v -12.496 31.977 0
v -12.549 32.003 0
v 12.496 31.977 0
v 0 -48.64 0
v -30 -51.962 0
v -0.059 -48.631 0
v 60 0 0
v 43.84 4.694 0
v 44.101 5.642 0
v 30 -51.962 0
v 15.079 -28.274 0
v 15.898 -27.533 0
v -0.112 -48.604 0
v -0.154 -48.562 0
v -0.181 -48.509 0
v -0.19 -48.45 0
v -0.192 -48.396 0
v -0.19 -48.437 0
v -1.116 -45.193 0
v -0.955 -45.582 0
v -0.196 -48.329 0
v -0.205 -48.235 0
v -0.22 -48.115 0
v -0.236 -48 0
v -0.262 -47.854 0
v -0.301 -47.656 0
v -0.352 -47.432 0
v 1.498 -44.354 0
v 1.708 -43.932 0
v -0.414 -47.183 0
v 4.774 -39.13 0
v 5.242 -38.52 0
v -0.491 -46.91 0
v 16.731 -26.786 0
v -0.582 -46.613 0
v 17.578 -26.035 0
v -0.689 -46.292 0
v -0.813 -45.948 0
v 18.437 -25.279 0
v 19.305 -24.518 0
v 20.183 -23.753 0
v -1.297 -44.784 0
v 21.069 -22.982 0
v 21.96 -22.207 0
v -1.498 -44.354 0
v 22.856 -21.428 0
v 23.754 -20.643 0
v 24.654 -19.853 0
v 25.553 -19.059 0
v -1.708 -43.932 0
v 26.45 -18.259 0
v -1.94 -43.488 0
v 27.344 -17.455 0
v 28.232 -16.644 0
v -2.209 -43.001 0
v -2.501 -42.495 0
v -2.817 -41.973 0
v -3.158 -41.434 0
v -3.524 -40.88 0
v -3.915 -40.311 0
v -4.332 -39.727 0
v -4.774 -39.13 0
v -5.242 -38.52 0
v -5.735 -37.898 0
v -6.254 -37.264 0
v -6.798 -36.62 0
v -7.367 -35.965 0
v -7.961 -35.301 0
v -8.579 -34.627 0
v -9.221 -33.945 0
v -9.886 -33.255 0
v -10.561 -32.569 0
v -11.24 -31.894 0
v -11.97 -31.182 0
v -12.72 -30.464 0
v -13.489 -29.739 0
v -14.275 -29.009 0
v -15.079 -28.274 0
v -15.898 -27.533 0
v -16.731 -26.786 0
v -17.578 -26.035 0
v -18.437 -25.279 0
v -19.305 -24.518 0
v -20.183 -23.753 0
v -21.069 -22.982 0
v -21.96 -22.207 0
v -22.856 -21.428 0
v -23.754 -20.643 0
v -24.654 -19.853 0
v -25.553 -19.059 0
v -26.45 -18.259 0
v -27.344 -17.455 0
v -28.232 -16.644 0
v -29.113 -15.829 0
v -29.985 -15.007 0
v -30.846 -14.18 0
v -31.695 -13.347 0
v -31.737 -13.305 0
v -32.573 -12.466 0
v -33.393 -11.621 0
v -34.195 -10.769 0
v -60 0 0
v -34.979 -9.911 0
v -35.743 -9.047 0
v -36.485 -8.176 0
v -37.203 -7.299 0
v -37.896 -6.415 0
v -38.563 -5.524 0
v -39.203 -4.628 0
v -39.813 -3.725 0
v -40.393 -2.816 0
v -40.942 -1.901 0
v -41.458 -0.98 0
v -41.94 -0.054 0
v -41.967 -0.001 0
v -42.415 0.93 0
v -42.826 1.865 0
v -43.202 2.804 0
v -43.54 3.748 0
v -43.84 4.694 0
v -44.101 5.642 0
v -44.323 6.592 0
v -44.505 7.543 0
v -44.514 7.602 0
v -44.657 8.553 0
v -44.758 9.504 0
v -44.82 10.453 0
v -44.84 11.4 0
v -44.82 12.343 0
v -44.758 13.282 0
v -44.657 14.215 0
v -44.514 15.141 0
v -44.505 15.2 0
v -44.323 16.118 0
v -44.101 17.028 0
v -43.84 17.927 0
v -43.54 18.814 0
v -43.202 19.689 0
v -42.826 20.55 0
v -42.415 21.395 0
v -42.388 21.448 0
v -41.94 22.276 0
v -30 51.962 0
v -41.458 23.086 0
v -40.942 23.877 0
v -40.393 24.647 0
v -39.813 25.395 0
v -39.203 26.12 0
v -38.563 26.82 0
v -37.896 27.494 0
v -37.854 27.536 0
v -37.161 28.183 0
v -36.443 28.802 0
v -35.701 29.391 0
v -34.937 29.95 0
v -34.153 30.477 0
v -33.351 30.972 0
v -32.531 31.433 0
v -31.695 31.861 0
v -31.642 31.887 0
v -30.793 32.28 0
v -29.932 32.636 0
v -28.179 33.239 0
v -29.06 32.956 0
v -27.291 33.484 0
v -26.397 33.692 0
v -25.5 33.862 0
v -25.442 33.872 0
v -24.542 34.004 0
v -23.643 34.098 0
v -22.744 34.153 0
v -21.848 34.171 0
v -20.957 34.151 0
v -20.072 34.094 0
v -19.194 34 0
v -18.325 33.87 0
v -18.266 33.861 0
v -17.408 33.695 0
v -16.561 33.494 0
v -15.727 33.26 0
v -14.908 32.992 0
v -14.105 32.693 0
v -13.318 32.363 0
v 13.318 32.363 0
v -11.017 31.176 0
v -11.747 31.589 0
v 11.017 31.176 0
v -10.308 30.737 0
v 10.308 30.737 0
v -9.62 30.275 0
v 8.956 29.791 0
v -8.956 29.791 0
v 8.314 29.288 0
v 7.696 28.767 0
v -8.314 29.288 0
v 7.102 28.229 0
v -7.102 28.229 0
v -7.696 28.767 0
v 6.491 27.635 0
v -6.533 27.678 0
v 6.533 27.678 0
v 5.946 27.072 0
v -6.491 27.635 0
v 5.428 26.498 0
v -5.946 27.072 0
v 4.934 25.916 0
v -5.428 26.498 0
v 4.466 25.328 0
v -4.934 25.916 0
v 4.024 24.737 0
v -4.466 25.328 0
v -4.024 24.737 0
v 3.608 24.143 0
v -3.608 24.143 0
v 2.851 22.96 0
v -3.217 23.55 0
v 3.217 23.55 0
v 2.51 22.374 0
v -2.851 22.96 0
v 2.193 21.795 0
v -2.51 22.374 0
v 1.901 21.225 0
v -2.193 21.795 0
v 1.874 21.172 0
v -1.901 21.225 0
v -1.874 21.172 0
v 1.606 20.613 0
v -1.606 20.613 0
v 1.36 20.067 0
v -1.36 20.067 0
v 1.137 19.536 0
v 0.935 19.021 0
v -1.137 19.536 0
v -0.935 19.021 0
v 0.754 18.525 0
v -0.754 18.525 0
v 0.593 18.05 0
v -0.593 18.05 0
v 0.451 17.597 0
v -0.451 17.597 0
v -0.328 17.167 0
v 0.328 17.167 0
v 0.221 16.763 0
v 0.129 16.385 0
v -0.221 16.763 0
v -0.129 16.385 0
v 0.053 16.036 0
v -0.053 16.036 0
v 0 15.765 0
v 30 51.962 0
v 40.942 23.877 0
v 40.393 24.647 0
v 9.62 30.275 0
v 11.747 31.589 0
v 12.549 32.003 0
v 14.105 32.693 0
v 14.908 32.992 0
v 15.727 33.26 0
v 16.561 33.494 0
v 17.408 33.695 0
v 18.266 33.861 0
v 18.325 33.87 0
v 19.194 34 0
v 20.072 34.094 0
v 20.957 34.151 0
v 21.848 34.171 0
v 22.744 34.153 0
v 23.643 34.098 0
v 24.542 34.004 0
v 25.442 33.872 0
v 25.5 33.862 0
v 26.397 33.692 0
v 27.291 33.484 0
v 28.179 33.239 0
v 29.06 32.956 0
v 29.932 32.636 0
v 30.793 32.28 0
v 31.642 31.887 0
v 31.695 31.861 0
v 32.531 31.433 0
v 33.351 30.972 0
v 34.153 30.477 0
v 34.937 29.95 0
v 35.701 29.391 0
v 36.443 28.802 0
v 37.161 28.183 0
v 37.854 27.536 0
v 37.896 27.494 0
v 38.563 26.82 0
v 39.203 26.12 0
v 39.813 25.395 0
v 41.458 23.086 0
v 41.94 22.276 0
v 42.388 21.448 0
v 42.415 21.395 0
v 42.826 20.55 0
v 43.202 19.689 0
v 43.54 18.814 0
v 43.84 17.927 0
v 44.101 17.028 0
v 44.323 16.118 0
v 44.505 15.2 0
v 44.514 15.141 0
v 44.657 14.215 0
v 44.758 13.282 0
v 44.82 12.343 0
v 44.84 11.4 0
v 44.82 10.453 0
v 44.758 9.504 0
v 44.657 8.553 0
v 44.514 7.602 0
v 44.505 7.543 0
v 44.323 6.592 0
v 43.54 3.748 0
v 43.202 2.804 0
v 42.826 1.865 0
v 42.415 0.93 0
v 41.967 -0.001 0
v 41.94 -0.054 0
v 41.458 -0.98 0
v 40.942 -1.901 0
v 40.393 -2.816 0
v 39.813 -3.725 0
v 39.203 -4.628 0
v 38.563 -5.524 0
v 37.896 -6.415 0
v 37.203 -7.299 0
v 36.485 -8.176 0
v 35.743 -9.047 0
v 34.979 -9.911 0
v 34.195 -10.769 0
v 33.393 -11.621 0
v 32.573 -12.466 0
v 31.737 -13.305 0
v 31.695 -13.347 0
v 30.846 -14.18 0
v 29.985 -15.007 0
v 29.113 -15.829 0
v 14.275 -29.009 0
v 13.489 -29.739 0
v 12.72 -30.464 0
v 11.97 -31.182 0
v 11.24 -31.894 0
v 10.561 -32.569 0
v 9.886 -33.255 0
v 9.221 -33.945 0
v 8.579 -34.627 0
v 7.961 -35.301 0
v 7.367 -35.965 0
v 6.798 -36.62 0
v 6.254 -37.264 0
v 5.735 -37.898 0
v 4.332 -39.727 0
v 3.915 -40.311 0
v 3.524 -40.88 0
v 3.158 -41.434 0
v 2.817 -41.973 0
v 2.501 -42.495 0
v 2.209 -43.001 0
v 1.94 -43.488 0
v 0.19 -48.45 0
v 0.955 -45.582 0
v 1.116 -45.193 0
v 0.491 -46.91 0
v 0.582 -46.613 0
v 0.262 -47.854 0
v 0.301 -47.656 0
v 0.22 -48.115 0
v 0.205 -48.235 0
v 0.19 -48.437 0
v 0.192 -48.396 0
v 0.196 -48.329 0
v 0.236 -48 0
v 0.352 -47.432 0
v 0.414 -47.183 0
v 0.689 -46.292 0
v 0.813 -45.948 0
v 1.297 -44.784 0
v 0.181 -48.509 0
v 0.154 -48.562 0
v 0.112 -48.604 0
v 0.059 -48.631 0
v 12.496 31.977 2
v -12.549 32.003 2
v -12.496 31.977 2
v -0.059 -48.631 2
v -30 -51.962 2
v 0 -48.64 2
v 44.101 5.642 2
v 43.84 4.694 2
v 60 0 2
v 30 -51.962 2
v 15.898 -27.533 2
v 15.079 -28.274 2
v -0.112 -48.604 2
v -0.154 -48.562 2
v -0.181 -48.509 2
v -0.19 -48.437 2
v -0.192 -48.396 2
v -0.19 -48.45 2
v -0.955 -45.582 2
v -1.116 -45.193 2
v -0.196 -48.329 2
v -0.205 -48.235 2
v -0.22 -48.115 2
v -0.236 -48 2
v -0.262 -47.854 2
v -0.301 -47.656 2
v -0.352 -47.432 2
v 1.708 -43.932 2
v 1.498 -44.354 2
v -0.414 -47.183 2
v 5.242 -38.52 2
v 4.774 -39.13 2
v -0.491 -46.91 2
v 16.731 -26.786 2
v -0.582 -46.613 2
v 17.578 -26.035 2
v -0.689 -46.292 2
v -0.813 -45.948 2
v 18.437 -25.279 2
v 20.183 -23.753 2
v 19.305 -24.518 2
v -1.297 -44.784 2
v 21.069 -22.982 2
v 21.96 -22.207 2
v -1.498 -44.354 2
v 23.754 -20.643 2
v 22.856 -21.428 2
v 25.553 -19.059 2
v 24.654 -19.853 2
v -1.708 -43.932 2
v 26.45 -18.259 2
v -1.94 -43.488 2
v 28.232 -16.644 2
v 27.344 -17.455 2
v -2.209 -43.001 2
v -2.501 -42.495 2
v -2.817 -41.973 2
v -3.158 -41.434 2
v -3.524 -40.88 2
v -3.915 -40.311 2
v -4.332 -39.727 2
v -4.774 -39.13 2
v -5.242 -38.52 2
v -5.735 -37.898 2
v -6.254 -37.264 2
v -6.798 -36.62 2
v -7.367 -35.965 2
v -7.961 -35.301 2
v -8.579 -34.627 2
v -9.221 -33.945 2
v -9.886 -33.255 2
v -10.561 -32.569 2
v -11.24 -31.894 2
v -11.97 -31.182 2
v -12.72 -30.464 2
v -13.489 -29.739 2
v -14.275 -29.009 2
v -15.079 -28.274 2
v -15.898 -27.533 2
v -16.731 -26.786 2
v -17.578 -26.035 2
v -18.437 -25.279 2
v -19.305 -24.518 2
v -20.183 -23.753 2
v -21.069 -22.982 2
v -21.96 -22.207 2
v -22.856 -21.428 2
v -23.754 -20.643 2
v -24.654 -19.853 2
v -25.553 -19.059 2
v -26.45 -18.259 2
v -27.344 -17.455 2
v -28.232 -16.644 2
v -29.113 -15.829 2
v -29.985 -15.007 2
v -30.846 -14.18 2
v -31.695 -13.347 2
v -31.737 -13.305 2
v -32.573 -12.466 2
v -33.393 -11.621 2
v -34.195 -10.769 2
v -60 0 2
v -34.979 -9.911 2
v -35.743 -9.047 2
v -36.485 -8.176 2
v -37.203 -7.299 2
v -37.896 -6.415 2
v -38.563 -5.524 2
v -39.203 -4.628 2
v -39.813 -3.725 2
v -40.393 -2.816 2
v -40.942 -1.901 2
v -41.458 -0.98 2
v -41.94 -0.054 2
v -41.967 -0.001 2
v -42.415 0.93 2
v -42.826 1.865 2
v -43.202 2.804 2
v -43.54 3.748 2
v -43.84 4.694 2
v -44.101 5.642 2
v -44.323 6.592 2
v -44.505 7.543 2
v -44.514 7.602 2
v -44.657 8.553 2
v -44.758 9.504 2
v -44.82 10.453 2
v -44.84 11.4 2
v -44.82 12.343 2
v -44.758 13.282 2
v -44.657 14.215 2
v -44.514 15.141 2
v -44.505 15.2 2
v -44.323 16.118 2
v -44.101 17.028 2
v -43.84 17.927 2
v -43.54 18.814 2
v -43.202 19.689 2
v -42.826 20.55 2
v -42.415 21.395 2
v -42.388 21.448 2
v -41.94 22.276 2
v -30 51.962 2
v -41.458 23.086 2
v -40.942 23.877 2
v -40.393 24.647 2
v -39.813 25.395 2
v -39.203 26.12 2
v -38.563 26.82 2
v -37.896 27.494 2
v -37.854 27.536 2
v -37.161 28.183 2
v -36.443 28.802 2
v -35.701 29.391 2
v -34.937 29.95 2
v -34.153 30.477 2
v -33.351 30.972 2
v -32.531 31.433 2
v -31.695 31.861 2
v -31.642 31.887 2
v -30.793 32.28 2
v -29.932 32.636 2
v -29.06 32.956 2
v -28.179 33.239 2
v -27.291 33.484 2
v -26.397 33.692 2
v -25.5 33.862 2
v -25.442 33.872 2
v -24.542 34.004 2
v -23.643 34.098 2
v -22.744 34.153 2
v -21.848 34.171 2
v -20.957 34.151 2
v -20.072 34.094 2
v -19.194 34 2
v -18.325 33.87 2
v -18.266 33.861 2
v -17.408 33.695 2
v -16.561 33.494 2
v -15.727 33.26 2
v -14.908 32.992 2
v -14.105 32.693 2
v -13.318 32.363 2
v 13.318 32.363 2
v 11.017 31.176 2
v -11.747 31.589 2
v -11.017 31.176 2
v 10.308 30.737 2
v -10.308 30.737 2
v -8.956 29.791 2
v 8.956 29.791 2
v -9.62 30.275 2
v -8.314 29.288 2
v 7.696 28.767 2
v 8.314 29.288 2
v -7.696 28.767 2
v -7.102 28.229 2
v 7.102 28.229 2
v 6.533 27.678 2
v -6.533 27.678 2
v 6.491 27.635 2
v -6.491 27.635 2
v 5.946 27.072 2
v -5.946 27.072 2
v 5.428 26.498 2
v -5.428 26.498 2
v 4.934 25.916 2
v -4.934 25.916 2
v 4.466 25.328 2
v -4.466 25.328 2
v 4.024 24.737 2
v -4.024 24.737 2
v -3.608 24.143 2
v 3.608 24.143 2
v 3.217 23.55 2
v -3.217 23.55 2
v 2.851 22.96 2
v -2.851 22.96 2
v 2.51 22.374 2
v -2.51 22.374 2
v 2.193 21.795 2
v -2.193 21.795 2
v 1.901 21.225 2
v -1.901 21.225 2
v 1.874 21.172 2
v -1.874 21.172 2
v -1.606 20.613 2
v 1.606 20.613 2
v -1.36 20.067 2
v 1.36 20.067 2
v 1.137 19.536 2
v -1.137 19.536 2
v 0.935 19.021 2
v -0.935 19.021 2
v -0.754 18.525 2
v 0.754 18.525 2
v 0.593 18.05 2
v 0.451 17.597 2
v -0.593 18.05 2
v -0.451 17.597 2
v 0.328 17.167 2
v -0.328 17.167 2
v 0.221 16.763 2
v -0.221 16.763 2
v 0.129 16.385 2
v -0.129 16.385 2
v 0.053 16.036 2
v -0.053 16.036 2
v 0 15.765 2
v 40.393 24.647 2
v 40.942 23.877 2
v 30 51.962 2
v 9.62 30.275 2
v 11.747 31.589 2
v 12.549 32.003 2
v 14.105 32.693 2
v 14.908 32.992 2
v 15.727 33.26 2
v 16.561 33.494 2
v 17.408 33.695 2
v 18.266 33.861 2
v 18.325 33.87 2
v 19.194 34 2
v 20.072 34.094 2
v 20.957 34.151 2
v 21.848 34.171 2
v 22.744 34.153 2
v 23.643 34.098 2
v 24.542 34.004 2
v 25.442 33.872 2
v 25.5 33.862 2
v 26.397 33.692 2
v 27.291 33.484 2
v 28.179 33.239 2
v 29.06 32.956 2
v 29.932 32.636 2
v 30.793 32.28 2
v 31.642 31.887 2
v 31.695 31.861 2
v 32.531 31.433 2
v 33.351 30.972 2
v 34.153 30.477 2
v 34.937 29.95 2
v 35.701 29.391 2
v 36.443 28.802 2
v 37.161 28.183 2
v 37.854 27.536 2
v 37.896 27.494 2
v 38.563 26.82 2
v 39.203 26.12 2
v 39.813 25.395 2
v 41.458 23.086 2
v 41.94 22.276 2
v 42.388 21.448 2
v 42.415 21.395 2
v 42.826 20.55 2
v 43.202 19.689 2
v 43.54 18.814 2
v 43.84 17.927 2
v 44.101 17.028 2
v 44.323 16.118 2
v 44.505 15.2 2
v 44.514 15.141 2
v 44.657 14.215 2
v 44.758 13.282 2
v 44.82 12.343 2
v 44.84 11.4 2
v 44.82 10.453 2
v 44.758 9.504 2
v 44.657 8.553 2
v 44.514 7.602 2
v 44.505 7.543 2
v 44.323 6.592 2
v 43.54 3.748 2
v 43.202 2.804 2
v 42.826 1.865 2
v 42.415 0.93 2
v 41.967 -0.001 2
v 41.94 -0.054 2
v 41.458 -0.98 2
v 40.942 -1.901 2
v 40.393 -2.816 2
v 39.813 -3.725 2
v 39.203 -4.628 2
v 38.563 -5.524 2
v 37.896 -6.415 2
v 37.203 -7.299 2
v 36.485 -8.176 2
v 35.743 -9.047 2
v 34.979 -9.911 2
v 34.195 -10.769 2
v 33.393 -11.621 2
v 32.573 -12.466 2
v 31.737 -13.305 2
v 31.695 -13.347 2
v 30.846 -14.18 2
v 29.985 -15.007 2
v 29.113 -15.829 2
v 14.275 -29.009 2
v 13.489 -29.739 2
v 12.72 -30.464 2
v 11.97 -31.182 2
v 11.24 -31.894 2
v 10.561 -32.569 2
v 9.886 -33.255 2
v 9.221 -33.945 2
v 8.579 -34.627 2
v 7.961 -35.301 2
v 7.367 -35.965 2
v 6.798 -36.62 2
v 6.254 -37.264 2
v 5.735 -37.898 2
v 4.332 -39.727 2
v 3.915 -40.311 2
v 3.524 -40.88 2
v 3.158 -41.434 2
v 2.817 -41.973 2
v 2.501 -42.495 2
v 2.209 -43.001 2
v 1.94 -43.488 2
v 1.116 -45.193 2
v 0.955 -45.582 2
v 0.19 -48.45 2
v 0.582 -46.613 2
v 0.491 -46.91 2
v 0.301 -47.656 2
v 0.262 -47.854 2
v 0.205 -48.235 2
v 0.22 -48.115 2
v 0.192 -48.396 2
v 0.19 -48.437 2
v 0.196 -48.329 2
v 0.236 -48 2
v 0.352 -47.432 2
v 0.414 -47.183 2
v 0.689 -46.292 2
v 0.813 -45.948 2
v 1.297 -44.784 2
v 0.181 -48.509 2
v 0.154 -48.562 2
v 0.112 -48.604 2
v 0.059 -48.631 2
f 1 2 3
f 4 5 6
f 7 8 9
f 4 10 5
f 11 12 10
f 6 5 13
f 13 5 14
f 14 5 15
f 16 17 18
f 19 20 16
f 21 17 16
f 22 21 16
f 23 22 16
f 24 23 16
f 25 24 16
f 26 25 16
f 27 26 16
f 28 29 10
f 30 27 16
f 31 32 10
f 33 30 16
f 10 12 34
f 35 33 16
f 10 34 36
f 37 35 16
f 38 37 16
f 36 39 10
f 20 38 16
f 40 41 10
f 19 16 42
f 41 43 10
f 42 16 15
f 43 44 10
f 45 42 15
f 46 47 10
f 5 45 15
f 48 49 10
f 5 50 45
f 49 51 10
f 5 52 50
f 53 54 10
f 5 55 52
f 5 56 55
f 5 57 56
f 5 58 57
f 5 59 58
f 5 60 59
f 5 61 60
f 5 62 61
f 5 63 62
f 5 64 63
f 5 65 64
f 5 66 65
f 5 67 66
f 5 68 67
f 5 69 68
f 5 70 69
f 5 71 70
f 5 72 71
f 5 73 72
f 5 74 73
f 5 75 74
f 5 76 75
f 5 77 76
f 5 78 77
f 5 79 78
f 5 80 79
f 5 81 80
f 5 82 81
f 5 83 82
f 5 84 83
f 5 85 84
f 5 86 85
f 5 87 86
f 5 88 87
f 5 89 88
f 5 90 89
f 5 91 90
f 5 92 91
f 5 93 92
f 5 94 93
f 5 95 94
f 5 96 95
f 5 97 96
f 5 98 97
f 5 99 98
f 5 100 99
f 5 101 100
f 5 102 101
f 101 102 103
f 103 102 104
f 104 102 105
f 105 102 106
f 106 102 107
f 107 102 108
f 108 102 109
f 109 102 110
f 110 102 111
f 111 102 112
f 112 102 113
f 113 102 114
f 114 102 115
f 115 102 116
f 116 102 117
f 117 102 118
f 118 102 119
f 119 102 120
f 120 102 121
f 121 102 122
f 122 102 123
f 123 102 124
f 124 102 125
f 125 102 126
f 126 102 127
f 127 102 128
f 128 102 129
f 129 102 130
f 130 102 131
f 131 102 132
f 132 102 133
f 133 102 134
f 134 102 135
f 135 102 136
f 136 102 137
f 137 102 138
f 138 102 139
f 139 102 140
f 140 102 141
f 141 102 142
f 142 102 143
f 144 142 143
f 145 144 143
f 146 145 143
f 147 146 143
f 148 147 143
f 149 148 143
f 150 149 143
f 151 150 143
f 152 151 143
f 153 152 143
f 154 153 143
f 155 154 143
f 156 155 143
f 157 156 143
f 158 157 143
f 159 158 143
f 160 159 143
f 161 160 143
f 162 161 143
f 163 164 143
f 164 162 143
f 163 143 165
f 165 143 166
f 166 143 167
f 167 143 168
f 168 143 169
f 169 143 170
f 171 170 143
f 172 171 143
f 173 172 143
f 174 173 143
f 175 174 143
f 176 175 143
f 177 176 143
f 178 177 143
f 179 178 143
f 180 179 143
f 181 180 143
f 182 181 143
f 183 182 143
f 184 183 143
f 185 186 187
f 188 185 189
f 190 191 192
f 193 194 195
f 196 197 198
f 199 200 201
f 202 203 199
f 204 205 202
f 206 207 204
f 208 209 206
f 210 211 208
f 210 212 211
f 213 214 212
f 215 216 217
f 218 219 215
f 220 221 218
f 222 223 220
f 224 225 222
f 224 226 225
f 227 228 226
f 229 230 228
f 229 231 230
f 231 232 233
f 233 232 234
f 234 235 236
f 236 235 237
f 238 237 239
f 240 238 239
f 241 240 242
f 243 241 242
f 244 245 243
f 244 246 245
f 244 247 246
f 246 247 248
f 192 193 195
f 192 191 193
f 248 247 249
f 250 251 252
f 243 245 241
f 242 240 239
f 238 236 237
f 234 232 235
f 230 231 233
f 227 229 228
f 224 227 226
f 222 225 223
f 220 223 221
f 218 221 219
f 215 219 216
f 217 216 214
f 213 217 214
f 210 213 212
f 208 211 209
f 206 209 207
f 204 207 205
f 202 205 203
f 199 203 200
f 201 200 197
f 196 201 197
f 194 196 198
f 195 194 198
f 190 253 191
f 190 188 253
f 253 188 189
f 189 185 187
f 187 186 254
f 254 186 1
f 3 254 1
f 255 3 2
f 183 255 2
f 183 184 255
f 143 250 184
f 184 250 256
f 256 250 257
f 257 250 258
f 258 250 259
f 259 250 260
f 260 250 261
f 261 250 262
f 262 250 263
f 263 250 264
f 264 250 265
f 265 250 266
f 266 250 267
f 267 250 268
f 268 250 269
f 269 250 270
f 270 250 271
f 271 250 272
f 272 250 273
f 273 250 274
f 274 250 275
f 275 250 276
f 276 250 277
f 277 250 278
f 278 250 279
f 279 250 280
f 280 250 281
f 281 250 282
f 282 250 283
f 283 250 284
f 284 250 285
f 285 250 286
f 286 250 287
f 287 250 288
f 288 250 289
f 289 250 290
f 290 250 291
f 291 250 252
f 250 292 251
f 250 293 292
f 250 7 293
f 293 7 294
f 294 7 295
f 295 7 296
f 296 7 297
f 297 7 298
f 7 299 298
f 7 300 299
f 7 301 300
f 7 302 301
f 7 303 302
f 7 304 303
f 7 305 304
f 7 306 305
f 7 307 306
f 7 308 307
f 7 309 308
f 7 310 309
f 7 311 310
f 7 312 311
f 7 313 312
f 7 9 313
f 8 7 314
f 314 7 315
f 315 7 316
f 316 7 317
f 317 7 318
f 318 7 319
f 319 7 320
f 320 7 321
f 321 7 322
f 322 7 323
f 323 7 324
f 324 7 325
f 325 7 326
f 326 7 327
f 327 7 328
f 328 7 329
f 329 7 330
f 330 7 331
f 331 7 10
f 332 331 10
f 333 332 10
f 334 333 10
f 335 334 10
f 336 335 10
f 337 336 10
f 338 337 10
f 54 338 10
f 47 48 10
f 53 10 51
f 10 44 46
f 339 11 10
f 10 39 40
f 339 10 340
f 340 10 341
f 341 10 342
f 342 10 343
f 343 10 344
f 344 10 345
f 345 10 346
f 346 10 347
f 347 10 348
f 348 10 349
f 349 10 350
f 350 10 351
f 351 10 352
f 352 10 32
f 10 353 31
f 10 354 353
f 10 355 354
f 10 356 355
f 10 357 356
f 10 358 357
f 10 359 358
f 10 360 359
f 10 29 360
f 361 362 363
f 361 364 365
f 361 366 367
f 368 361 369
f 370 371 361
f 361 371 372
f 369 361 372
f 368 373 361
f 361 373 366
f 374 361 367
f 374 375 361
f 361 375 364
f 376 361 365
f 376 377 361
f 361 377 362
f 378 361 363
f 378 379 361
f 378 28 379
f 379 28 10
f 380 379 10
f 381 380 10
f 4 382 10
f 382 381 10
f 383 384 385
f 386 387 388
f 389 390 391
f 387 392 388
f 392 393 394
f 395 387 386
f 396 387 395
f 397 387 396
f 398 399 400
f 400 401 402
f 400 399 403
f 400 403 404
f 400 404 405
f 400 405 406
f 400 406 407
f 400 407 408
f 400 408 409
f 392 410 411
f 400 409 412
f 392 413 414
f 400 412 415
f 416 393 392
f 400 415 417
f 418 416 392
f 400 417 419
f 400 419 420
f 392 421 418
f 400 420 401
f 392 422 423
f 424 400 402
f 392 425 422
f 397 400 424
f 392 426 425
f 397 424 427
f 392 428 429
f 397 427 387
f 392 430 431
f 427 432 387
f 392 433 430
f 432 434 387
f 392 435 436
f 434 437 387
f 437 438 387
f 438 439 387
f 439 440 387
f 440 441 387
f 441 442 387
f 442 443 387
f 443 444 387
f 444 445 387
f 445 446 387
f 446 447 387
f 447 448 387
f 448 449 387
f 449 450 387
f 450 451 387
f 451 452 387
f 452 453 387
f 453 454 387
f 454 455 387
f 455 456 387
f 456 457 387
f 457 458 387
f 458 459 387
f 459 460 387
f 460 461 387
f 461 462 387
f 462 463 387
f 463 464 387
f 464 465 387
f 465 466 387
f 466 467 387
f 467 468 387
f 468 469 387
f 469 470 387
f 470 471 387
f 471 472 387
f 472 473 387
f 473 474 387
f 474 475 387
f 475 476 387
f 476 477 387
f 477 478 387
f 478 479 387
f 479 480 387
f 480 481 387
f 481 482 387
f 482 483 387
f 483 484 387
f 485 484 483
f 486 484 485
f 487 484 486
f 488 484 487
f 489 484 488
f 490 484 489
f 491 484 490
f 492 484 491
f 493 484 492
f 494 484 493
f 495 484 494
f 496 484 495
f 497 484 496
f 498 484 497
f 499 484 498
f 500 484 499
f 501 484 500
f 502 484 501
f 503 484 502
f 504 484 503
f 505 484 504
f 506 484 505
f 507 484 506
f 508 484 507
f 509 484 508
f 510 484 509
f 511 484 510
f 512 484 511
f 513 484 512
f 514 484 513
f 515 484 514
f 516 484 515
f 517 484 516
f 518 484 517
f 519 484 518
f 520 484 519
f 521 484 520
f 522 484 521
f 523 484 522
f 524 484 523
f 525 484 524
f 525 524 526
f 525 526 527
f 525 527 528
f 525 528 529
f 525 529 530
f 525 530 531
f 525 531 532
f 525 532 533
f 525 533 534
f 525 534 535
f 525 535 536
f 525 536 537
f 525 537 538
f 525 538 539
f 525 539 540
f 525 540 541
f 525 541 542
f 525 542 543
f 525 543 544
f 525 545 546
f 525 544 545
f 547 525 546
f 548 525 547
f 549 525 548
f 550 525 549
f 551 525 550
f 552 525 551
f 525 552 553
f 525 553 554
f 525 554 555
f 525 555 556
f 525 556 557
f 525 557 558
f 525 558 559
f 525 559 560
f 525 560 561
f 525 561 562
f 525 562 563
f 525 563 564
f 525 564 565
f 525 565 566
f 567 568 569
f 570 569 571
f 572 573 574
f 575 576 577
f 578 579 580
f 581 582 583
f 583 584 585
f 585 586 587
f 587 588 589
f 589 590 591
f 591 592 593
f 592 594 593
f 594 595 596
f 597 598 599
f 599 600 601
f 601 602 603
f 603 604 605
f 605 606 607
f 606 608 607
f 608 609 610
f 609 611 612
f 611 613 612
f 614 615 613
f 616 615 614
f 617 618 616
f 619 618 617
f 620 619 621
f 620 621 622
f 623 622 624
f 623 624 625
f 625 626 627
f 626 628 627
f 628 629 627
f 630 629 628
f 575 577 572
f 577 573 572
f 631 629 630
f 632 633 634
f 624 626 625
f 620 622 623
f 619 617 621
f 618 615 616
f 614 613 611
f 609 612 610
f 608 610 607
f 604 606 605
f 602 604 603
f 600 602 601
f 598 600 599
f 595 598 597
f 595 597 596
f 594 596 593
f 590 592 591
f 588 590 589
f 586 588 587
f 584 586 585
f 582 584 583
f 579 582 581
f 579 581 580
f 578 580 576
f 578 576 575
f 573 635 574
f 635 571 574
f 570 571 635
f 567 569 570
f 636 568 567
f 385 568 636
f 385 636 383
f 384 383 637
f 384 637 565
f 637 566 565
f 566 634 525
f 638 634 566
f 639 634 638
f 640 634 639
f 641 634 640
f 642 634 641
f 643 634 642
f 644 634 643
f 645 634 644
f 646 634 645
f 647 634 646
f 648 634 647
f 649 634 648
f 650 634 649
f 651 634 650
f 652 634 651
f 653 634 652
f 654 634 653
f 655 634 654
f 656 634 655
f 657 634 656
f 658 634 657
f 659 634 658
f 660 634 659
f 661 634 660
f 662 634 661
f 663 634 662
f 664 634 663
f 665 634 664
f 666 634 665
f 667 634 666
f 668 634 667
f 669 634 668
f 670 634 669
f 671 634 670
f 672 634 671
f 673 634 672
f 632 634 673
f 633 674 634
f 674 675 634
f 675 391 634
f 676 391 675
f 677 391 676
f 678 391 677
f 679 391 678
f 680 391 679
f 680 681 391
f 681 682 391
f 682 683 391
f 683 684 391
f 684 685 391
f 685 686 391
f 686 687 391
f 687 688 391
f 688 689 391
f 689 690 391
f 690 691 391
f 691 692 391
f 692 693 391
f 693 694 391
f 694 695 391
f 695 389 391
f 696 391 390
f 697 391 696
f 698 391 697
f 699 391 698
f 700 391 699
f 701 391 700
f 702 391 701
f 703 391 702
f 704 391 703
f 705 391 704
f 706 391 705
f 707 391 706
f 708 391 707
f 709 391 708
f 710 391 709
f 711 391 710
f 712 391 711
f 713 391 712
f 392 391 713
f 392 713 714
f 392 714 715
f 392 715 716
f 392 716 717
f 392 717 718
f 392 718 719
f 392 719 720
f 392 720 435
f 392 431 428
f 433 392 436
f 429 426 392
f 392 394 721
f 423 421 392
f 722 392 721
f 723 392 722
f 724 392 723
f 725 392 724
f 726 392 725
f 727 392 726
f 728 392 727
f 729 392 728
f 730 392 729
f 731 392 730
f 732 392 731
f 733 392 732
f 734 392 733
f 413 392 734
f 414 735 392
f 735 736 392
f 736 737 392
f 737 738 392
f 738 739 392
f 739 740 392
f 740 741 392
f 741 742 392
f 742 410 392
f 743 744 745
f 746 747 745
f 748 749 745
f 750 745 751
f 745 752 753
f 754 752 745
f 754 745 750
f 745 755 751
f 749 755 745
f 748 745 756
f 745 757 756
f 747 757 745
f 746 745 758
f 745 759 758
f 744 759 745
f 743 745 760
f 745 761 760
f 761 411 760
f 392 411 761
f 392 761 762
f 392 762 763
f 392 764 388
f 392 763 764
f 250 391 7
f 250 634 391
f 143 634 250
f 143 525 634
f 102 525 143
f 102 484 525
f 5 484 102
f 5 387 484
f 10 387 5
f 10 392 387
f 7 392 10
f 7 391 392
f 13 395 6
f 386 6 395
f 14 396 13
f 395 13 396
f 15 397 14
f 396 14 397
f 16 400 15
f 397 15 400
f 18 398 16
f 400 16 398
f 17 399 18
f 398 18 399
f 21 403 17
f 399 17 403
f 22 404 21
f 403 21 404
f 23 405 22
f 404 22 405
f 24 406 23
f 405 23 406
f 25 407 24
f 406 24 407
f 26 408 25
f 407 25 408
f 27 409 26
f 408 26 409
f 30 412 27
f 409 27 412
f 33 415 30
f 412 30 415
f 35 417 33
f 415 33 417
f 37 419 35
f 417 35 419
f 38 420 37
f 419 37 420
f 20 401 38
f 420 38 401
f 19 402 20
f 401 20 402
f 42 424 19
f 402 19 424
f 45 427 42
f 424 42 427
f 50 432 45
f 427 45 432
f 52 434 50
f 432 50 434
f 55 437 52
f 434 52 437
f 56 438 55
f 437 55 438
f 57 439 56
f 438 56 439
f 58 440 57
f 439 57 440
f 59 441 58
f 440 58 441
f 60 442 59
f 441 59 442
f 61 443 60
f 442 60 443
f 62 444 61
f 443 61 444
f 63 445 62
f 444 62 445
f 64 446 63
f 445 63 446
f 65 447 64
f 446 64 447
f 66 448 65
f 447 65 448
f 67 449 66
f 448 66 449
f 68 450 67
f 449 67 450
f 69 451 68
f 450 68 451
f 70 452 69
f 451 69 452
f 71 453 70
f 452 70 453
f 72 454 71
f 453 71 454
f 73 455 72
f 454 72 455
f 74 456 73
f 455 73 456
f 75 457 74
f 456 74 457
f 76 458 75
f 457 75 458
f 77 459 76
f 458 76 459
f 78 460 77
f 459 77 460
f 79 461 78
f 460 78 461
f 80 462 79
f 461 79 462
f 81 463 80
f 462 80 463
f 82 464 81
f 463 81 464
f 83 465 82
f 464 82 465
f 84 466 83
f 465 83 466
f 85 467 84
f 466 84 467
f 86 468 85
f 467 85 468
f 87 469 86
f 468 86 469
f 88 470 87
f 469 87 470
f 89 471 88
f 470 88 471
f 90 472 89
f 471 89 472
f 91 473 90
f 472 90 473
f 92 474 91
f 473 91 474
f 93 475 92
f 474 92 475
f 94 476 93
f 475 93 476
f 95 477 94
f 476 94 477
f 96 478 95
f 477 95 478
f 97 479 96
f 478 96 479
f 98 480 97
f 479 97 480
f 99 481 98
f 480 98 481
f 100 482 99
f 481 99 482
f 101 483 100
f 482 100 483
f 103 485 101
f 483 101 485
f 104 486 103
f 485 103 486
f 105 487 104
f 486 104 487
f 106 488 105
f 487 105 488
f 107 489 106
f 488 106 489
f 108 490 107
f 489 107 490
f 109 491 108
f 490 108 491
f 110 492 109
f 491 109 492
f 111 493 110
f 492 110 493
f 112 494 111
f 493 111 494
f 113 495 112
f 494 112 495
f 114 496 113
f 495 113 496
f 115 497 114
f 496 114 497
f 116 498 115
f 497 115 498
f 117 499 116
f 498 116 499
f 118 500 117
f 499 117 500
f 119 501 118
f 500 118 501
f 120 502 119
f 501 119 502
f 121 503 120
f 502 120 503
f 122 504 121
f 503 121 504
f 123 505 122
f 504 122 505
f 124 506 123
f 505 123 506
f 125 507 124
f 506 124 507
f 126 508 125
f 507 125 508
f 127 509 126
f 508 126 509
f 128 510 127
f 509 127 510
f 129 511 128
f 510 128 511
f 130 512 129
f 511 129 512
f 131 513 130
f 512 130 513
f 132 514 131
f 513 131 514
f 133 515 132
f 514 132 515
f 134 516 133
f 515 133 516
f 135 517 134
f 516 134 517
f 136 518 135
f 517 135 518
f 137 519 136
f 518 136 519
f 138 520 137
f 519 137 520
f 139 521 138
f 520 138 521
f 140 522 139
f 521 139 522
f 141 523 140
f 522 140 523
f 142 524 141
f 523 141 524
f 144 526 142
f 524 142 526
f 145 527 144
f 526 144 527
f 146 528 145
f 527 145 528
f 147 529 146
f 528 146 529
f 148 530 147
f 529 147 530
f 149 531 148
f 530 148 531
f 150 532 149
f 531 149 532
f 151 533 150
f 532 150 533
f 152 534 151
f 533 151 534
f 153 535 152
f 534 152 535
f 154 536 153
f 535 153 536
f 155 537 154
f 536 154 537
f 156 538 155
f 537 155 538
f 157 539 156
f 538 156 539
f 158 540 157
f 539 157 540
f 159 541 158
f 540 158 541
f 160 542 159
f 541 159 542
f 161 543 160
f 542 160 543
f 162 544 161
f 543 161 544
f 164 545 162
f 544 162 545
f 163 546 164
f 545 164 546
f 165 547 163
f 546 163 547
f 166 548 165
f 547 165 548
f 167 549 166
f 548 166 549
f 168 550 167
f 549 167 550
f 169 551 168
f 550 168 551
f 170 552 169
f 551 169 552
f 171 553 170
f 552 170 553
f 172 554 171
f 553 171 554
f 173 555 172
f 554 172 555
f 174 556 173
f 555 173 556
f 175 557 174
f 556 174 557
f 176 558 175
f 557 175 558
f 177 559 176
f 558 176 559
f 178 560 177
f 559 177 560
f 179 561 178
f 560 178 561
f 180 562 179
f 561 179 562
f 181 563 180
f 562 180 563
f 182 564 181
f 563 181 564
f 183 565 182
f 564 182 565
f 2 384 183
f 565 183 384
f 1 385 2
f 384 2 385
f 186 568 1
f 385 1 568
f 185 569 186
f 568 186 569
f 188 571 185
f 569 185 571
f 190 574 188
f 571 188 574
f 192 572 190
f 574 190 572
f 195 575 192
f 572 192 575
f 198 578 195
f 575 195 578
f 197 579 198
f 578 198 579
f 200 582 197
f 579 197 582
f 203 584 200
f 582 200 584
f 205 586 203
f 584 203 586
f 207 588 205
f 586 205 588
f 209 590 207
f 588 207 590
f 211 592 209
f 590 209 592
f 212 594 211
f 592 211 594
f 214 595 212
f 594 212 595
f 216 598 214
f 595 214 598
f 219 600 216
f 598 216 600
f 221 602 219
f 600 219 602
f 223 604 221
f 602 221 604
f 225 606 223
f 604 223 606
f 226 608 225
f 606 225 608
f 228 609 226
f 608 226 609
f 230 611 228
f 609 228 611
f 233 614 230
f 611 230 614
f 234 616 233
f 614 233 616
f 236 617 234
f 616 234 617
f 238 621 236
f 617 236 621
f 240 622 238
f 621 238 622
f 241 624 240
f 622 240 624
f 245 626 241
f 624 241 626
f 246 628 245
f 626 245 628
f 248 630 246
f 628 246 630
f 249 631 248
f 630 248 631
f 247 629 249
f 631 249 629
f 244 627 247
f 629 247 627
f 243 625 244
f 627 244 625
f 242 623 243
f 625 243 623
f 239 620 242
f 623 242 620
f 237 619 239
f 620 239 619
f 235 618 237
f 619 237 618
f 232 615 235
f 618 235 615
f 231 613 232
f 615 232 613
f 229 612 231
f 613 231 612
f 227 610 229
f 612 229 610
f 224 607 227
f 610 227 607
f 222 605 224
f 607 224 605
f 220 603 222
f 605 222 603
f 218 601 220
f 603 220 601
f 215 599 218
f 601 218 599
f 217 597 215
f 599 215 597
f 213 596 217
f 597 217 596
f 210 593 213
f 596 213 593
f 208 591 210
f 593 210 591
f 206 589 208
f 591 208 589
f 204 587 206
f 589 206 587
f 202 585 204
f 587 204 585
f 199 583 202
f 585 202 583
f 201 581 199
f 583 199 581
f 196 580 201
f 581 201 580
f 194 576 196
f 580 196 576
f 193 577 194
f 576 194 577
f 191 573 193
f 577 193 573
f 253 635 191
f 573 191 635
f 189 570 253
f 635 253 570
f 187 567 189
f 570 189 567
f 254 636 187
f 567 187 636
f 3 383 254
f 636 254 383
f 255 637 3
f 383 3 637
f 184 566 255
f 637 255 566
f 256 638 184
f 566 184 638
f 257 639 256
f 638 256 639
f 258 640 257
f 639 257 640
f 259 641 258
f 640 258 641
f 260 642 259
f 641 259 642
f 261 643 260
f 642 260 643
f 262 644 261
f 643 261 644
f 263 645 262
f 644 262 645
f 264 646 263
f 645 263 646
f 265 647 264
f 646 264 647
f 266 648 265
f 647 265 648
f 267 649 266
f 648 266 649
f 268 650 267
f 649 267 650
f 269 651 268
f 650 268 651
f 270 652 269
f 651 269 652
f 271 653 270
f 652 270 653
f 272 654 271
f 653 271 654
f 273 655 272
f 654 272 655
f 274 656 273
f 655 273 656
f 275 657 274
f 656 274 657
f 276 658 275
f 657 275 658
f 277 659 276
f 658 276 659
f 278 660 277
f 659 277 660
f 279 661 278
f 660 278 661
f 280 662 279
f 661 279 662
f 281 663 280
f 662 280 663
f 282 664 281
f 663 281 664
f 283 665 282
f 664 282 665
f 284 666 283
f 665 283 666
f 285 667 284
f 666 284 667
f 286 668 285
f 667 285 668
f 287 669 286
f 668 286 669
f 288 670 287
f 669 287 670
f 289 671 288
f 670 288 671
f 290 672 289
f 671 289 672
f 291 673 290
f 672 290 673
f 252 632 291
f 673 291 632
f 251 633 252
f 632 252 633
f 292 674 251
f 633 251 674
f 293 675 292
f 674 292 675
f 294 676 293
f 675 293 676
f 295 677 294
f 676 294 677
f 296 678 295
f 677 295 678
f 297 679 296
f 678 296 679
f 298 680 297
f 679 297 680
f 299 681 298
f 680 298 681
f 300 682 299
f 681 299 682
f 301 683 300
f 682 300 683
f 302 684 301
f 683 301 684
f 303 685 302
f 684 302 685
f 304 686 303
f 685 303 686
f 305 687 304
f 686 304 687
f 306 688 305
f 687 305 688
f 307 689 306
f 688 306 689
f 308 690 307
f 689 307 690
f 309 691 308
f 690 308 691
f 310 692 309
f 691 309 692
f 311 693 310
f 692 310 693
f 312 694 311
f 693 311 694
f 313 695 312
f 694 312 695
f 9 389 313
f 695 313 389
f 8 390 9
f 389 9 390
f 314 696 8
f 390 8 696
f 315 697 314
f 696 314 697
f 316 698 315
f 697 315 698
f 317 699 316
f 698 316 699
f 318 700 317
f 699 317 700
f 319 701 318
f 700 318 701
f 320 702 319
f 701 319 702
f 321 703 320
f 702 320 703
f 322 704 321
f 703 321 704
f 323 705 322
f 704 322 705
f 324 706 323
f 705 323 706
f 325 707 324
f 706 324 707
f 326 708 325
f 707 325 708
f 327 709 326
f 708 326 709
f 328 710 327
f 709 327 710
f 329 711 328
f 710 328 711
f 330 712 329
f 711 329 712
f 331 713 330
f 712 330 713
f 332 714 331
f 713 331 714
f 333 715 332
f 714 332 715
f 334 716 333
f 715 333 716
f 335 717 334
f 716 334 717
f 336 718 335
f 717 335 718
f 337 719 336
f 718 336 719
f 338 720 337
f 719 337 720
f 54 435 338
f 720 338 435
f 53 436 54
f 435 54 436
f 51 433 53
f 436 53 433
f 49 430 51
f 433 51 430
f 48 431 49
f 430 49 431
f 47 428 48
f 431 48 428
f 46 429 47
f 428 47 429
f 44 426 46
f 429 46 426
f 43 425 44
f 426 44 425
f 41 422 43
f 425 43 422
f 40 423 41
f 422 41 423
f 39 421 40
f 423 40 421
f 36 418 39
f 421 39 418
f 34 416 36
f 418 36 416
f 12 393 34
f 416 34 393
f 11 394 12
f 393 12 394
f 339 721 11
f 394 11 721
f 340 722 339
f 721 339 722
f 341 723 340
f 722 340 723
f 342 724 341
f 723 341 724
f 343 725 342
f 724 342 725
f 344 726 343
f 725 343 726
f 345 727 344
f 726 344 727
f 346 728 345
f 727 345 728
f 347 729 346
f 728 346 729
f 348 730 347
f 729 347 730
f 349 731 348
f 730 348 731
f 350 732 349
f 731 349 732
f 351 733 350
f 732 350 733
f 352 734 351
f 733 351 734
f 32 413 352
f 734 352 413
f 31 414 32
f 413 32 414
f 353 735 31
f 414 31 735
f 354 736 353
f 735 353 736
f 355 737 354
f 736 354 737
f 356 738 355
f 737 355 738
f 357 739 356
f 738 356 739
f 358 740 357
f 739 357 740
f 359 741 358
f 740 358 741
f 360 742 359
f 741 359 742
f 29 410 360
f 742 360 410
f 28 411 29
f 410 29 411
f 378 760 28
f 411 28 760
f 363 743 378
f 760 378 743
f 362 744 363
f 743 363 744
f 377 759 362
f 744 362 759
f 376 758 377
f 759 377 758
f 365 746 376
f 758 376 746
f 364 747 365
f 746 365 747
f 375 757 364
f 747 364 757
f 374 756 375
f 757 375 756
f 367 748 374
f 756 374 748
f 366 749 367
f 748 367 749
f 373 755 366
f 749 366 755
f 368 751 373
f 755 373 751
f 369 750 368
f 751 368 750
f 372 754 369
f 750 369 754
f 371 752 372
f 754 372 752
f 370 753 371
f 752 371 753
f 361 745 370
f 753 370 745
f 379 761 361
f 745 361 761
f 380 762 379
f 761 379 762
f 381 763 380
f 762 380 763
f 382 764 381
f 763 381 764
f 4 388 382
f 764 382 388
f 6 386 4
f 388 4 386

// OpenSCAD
/* Función corazón
100hex https://tecnoloxia.org/100hex/
heart curve: http://mathworld.wolfram.com/HeartCurve.html
*/

// parámetros

hexagono=true;  // se queremos inserilo dentro dun hexágono
h=2;            // altura
hex=60;         // lado do hexágono

burato=true;    // true: burato, false: liña

espesor=2;    // ancho da liña
w= burato ? 0.4 : espesor;           // ancho da liña da función 

a=1;            // para escalar a función


// Función
//function x(t) = 16*pow(sin(t),3);
//function y(t) = 13*cos(t)-5*cos(2*t)-2*cos(3*t)-cos(4*t);

function x(t) = 47*pow(sin(t),3);
function y(t) = 39*cos(t)-15*cos(2*t)-6*cos(3*t)-3*cos(4*t);

module heart() {
    for(i=[-180:1:180]) {
        hull(){
            translate([a*x(i),a*y(i),0]) circle(r=w/2,  $fn=20);
            translate([a*x(i+1),a*y(i+1),0])circle(r=w/2,  $fn=20);
            if(burato==true){
                circle(r=w/2,  $fn=20);
            }
        } 
    }
}


// Dentro dun hexágono

if(hexagono==true){  
    linear_extrude(h) union(){   
        if(burato==true){
            difference() {
                circle(r=hex,  $fn=6);
                scale(0.95) heart(); 
            }
        }
        else{
            intersection() {
                circle(r=hex,  $fn=6);
                heart();
            }
        }            
      difference() {
          circle(r=hex,  $fn=6);
          circle(r=(hex-espesor/cos(30)),  $fn=6);
      }     
   }  
}
else{
    heart();
}
